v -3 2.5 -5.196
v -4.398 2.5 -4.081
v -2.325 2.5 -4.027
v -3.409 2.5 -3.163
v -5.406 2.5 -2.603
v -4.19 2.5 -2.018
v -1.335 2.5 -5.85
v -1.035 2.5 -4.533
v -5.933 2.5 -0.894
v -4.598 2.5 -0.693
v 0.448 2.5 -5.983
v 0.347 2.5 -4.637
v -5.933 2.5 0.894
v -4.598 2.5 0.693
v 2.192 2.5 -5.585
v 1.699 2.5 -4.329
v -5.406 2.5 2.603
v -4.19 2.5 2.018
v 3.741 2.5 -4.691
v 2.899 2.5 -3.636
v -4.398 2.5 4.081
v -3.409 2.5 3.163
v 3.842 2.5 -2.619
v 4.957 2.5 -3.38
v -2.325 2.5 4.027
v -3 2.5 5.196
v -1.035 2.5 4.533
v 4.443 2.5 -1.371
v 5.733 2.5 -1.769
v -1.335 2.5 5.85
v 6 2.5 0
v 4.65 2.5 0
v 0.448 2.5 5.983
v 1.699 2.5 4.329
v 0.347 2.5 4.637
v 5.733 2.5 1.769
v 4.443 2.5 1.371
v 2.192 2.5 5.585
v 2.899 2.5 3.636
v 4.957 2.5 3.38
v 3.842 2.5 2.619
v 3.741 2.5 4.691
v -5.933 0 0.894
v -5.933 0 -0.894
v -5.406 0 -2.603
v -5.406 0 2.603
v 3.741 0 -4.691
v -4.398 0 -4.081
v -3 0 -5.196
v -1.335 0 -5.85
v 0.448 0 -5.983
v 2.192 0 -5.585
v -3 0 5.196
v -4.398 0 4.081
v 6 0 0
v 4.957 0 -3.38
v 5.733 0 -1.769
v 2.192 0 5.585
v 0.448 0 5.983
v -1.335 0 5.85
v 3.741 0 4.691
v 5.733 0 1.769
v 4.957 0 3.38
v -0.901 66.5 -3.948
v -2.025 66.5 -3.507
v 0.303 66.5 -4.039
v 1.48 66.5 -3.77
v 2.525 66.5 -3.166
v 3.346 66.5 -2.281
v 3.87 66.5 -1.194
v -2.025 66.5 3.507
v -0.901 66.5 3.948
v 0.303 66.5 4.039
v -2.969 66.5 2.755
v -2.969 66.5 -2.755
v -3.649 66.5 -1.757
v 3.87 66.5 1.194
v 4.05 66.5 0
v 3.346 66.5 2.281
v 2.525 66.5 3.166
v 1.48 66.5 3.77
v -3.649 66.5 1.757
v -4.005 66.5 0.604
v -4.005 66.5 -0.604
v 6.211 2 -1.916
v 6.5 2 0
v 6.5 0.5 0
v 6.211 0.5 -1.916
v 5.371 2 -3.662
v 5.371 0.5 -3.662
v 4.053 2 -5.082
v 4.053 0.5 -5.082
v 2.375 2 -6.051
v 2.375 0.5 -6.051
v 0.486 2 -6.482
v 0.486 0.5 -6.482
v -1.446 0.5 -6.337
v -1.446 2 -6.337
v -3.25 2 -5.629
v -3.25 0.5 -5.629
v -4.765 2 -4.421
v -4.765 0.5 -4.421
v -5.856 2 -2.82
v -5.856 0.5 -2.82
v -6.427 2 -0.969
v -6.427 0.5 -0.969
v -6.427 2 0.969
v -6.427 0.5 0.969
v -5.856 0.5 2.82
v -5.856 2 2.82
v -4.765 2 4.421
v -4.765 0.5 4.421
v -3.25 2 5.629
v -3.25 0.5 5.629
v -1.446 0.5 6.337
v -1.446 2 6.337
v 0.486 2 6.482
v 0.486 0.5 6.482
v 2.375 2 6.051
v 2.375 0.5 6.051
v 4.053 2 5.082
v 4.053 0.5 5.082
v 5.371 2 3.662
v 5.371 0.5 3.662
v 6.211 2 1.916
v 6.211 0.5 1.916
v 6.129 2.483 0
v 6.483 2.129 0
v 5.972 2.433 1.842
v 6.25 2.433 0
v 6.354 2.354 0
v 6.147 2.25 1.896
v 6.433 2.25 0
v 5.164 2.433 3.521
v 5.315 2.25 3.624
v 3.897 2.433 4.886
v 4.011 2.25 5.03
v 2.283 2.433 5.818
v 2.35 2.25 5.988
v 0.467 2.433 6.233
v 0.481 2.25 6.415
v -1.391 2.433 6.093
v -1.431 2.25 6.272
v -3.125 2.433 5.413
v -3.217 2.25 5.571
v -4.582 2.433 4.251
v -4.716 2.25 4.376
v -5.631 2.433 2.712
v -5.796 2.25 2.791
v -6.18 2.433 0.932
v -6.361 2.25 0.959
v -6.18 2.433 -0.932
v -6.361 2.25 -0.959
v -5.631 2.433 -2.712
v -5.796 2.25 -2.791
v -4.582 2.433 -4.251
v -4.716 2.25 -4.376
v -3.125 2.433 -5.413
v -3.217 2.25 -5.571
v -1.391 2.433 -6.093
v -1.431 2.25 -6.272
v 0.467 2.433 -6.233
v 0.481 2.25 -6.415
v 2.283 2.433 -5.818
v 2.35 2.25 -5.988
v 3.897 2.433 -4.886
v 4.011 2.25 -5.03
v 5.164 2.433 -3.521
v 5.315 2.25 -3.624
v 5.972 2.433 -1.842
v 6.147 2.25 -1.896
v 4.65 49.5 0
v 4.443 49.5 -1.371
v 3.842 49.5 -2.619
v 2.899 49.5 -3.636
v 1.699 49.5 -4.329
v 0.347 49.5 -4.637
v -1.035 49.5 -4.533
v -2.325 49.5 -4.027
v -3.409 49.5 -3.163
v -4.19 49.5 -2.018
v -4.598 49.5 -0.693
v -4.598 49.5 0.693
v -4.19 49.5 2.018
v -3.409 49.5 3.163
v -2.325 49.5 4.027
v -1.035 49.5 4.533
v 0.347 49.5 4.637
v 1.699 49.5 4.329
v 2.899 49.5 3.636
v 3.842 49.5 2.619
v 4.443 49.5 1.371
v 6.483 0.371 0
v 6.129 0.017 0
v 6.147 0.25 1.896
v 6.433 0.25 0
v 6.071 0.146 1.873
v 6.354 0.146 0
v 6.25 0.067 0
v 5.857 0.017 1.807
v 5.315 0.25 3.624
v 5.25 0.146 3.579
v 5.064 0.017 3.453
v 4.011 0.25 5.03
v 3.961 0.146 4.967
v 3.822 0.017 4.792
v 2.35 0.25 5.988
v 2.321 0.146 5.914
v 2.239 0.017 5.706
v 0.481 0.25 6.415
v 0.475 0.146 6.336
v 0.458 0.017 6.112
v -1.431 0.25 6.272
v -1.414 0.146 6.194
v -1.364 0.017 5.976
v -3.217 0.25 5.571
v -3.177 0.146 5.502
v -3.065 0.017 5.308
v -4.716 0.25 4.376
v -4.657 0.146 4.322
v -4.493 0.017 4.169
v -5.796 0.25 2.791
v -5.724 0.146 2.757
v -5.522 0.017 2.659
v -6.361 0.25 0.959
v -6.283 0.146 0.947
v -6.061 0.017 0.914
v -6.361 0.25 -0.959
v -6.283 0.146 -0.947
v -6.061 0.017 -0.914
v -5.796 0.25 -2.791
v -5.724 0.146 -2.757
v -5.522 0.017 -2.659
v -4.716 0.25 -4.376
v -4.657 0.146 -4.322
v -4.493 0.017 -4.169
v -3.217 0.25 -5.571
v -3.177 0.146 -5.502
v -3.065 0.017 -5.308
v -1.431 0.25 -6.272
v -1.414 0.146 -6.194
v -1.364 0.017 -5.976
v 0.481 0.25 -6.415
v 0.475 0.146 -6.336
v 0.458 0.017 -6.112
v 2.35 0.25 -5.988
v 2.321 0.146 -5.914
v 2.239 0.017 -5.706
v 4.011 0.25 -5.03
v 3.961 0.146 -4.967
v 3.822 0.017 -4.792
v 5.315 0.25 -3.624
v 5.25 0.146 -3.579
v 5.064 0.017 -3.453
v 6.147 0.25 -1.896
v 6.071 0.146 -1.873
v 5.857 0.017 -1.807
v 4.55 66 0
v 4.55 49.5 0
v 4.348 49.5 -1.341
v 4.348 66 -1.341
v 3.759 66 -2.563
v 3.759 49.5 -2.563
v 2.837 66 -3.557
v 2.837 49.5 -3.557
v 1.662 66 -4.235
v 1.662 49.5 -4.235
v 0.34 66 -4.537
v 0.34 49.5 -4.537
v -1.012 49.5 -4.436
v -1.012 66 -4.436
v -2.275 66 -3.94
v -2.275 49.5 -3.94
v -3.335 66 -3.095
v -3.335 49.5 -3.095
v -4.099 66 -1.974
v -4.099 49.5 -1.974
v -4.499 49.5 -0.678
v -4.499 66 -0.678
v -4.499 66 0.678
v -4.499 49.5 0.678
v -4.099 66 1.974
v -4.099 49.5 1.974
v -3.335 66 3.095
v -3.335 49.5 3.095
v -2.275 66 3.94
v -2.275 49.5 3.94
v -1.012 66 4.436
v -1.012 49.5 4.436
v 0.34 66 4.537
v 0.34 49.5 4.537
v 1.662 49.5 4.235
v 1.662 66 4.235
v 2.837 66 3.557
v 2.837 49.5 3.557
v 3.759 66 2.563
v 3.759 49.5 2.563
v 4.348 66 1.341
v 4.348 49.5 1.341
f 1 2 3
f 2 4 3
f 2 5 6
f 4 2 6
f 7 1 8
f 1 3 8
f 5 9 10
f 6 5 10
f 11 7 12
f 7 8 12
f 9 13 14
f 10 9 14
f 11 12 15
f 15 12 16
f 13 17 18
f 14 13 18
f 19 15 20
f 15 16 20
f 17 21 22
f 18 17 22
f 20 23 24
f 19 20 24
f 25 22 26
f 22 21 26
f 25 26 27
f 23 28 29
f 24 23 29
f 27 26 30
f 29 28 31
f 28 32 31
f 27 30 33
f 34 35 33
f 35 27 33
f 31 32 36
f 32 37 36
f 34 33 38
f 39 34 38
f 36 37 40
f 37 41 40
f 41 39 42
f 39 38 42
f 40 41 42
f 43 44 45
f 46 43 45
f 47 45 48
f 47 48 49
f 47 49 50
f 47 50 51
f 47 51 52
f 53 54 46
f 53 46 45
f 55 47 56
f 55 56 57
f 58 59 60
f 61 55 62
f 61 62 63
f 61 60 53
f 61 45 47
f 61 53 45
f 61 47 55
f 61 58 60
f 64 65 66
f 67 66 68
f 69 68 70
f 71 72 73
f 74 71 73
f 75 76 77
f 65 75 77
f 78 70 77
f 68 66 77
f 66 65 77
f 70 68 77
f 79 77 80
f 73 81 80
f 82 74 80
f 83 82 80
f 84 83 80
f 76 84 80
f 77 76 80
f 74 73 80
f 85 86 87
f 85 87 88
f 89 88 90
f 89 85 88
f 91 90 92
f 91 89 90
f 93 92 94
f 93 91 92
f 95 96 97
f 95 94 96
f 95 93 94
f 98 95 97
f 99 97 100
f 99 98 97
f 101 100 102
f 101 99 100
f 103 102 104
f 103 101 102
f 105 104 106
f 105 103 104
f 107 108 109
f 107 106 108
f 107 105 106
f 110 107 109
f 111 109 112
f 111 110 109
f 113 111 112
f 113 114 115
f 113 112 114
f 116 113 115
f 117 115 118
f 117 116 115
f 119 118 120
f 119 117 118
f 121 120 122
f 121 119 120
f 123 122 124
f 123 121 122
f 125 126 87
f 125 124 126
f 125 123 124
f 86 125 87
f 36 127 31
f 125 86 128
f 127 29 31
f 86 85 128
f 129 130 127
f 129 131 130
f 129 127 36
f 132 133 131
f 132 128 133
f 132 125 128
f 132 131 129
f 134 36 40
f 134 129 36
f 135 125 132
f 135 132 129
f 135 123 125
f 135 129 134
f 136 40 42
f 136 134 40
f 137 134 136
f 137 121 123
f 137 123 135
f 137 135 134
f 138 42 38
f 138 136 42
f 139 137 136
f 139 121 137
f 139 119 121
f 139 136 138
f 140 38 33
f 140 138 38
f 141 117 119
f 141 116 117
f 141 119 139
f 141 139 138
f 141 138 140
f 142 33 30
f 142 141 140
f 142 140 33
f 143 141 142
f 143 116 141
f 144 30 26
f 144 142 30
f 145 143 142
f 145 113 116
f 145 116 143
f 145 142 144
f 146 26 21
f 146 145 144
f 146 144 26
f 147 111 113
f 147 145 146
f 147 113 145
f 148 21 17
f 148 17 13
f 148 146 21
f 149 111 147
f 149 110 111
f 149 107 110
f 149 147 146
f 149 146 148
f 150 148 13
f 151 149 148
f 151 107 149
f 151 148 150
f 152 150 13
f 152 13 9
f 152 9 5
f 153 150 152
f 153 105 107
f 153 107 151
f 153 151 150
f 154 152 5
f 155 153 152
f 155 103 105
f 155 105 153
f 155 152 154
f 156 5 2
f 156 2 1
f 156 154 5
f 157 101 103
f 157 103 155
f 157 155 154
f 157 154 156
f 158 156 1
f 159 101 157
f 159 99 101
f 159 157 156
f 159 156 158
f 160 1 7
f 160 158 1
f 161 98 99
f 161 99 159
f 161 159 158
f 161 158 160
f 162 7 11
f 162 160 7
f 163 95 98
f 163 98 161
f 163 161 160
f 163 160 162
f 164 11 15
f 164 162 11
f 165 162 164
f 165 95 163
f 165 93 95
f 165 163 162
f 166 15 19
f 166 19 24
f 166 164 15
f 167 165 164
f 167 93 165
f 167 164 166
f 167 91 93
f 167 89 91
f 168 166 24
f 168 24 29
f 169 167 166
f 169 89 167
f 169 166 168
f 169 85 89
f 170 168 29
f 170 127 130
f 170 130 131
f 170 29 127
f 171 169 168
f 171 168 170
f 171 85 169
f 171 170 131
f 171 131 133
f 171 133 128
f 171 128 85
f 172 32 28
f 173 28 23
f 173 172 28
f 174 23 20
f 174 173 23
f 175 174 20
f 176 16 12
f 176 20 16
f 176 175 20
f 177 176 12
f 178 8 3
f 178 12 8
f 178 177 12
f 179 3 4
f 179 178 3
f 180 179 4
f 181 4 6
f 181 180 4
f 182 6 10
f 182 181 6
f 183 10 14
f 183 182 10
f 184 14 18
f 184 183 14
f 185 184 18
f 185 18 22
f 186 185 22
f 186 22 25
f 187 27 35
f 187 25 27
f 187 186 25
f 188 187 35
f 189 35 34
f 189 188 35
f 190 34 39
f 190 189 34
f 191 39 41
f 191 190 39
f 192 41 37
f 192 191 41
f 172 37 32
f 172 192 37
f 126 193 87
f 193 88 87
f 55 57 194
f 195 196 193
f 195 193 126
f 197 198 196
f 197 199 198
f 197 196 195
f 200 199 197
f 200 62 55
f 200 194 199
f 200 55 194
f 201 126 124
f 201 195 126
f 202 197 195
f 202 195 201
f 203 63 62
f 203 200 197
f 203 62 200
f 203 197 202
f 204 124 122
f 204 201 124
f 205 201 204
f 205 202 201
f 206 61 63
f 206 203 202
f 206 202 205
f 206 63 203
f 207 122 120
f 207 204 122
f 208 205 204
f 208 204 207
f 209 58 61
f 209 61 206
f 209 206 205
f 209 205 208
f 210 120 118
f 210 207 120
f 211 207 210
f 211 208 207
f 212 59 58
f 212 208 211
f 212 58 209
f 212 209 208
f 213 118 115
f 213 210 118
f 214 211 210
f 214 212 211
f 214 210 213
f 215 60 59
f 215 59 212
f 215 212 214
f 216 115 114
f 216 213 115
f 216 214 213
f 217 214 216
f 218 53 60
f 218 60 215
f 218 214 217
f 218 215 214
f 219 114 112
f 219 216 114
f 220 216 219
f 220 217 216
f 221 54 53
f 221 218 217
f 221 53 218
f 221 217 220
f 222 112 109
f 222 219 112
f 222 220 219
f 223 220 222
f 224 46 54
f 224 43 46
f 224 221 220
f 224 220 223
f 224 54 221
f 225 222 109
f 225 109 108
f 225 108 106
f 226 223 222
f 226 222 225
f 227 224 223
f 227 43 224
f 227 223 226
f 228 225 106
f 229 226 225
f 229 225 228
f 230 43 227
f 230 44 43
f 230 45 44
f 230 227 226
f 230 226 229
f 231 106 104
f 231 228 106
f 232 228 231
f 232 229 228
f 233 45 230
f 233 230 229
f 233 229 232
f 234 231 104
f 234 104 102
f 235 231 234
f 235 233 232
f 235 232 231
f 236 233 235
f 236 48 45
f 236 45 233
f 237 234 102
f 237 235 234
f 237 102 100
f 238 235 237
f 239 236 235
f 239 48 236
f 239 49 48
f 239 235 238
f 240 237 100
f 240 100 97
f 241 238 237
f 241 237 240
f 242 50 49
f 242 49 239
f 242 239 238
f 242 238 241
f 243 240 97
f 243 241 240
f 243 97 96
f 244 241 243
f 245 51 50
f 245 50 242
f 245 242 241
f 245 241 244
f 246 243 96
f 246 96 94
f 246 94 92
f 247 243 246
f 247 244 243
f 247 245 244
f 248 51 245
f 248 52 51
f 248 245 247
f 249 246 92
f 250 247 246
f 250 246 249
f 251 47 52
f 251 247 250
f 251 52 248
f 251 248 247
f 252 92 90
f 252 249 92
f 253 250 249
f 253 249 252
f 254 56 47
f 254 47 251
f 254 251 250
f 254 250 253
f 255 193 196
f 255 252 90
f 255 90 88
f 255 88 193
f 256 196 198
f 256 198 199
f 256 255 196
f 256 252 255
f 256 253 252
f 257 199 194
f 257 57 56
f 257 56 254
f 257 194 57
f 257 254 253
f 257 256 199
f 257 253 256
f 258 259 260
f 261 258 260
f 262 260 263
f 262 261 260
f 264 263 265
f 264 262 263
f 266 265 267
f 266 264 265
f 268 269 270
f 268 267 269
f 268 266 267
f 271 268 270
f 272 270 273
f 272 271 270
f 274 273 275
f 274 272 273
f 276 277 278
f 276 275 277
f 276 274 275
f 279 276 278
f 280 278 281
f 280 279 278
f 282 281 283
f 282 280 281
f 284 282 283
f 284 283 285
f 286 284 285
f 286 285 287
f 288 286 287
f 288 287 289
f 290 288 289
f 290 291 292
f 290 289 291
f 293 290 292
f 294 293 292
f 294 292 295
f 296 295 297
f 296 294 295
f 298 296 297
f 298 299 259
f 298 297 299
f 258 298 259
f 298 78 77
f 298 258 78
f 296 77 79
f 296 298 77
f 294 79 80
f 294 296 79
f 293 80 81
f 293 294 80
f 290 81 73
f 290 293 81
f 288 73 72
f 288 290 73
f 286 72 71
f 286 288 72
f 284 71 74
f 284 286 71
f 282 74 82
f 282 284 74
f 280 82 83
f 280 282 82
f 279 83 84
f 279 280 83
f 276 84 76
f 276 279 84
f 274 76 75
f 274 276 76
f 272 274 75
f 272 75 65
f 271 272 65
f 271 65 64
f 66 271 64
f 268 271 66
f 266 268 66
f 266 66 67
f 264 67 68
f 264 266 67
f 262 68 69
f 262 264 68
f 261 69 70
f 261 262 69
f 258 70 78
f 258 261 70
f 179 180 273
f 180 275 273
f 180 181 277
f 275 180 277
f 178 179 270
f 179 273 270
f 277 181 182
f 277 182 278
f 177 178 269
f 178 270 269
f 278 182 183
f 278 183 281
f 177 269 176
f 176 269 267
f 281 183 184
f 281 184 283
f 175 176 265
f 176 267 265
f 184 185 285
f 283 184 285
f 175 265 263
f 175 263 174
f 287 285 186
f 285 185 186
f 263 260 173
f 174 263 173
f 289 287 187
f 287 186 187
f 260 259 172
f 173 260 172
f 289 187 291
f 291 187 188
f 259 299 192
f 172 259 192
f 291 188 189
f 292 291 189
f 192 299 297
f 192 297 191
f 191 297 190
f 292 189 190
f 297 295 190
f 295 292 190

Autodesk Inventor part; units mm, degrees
ref_plane "YZ Plane" through (0, 0, 0) normal (1, 0, 0) x (0, 1, 0)
ref_plane "XZ Plane" through (0, 0, 0) normal (0, 1, 0) x (-1, 0, 0)
ref_plane "XY Plane" through (0, 0, 0) normal (0, 0, 1) x (1, 0, 0)
sketch "Эскиз1" plane through (0, 0, 0) normal (0, 0, 1) x (1, 0, 0)
  line L0 (0, 0) -> (6.5, 0)
  line L1 (6.5, 0) -> (6.5, 2.5)
  line L2 (6.5, 2.5) -> (4.65, 2.5)
  line L3 (4.65, 2.5) -> (4.65, 49.5)
  line L4 (4.65, 49.5) -> (4.55, 49.5)
  line L5 (4.55, 49.5) -> (4.55, 66.5)
  line L6 (4.55, 66.5) -> (0, 66.5)
  line L7 (0, 66.5) -> (0, 0)
  dimension "d1" = 64
  dimension "d2" = 9.3
  dimension "d3" = 0.1
  dimension "d4" = 13
  dimension "d5" = 2.5
  dimension "d6" = 17
revolve "Вращение1" add sketch "Эскиз1" angle 360 about axis through (0, 66.5, 0) along (0, -1, 0)
fillet "Сопряжение1" radius 0.5 2 edges at (-6.5, 2.5, 0) (-6.5, 0, 0)
chamfer "Фаска1" distance 0.5 angle 45 1 edges at (-4.55, 66.5, 0)
properties part number "paris_kingpin"
